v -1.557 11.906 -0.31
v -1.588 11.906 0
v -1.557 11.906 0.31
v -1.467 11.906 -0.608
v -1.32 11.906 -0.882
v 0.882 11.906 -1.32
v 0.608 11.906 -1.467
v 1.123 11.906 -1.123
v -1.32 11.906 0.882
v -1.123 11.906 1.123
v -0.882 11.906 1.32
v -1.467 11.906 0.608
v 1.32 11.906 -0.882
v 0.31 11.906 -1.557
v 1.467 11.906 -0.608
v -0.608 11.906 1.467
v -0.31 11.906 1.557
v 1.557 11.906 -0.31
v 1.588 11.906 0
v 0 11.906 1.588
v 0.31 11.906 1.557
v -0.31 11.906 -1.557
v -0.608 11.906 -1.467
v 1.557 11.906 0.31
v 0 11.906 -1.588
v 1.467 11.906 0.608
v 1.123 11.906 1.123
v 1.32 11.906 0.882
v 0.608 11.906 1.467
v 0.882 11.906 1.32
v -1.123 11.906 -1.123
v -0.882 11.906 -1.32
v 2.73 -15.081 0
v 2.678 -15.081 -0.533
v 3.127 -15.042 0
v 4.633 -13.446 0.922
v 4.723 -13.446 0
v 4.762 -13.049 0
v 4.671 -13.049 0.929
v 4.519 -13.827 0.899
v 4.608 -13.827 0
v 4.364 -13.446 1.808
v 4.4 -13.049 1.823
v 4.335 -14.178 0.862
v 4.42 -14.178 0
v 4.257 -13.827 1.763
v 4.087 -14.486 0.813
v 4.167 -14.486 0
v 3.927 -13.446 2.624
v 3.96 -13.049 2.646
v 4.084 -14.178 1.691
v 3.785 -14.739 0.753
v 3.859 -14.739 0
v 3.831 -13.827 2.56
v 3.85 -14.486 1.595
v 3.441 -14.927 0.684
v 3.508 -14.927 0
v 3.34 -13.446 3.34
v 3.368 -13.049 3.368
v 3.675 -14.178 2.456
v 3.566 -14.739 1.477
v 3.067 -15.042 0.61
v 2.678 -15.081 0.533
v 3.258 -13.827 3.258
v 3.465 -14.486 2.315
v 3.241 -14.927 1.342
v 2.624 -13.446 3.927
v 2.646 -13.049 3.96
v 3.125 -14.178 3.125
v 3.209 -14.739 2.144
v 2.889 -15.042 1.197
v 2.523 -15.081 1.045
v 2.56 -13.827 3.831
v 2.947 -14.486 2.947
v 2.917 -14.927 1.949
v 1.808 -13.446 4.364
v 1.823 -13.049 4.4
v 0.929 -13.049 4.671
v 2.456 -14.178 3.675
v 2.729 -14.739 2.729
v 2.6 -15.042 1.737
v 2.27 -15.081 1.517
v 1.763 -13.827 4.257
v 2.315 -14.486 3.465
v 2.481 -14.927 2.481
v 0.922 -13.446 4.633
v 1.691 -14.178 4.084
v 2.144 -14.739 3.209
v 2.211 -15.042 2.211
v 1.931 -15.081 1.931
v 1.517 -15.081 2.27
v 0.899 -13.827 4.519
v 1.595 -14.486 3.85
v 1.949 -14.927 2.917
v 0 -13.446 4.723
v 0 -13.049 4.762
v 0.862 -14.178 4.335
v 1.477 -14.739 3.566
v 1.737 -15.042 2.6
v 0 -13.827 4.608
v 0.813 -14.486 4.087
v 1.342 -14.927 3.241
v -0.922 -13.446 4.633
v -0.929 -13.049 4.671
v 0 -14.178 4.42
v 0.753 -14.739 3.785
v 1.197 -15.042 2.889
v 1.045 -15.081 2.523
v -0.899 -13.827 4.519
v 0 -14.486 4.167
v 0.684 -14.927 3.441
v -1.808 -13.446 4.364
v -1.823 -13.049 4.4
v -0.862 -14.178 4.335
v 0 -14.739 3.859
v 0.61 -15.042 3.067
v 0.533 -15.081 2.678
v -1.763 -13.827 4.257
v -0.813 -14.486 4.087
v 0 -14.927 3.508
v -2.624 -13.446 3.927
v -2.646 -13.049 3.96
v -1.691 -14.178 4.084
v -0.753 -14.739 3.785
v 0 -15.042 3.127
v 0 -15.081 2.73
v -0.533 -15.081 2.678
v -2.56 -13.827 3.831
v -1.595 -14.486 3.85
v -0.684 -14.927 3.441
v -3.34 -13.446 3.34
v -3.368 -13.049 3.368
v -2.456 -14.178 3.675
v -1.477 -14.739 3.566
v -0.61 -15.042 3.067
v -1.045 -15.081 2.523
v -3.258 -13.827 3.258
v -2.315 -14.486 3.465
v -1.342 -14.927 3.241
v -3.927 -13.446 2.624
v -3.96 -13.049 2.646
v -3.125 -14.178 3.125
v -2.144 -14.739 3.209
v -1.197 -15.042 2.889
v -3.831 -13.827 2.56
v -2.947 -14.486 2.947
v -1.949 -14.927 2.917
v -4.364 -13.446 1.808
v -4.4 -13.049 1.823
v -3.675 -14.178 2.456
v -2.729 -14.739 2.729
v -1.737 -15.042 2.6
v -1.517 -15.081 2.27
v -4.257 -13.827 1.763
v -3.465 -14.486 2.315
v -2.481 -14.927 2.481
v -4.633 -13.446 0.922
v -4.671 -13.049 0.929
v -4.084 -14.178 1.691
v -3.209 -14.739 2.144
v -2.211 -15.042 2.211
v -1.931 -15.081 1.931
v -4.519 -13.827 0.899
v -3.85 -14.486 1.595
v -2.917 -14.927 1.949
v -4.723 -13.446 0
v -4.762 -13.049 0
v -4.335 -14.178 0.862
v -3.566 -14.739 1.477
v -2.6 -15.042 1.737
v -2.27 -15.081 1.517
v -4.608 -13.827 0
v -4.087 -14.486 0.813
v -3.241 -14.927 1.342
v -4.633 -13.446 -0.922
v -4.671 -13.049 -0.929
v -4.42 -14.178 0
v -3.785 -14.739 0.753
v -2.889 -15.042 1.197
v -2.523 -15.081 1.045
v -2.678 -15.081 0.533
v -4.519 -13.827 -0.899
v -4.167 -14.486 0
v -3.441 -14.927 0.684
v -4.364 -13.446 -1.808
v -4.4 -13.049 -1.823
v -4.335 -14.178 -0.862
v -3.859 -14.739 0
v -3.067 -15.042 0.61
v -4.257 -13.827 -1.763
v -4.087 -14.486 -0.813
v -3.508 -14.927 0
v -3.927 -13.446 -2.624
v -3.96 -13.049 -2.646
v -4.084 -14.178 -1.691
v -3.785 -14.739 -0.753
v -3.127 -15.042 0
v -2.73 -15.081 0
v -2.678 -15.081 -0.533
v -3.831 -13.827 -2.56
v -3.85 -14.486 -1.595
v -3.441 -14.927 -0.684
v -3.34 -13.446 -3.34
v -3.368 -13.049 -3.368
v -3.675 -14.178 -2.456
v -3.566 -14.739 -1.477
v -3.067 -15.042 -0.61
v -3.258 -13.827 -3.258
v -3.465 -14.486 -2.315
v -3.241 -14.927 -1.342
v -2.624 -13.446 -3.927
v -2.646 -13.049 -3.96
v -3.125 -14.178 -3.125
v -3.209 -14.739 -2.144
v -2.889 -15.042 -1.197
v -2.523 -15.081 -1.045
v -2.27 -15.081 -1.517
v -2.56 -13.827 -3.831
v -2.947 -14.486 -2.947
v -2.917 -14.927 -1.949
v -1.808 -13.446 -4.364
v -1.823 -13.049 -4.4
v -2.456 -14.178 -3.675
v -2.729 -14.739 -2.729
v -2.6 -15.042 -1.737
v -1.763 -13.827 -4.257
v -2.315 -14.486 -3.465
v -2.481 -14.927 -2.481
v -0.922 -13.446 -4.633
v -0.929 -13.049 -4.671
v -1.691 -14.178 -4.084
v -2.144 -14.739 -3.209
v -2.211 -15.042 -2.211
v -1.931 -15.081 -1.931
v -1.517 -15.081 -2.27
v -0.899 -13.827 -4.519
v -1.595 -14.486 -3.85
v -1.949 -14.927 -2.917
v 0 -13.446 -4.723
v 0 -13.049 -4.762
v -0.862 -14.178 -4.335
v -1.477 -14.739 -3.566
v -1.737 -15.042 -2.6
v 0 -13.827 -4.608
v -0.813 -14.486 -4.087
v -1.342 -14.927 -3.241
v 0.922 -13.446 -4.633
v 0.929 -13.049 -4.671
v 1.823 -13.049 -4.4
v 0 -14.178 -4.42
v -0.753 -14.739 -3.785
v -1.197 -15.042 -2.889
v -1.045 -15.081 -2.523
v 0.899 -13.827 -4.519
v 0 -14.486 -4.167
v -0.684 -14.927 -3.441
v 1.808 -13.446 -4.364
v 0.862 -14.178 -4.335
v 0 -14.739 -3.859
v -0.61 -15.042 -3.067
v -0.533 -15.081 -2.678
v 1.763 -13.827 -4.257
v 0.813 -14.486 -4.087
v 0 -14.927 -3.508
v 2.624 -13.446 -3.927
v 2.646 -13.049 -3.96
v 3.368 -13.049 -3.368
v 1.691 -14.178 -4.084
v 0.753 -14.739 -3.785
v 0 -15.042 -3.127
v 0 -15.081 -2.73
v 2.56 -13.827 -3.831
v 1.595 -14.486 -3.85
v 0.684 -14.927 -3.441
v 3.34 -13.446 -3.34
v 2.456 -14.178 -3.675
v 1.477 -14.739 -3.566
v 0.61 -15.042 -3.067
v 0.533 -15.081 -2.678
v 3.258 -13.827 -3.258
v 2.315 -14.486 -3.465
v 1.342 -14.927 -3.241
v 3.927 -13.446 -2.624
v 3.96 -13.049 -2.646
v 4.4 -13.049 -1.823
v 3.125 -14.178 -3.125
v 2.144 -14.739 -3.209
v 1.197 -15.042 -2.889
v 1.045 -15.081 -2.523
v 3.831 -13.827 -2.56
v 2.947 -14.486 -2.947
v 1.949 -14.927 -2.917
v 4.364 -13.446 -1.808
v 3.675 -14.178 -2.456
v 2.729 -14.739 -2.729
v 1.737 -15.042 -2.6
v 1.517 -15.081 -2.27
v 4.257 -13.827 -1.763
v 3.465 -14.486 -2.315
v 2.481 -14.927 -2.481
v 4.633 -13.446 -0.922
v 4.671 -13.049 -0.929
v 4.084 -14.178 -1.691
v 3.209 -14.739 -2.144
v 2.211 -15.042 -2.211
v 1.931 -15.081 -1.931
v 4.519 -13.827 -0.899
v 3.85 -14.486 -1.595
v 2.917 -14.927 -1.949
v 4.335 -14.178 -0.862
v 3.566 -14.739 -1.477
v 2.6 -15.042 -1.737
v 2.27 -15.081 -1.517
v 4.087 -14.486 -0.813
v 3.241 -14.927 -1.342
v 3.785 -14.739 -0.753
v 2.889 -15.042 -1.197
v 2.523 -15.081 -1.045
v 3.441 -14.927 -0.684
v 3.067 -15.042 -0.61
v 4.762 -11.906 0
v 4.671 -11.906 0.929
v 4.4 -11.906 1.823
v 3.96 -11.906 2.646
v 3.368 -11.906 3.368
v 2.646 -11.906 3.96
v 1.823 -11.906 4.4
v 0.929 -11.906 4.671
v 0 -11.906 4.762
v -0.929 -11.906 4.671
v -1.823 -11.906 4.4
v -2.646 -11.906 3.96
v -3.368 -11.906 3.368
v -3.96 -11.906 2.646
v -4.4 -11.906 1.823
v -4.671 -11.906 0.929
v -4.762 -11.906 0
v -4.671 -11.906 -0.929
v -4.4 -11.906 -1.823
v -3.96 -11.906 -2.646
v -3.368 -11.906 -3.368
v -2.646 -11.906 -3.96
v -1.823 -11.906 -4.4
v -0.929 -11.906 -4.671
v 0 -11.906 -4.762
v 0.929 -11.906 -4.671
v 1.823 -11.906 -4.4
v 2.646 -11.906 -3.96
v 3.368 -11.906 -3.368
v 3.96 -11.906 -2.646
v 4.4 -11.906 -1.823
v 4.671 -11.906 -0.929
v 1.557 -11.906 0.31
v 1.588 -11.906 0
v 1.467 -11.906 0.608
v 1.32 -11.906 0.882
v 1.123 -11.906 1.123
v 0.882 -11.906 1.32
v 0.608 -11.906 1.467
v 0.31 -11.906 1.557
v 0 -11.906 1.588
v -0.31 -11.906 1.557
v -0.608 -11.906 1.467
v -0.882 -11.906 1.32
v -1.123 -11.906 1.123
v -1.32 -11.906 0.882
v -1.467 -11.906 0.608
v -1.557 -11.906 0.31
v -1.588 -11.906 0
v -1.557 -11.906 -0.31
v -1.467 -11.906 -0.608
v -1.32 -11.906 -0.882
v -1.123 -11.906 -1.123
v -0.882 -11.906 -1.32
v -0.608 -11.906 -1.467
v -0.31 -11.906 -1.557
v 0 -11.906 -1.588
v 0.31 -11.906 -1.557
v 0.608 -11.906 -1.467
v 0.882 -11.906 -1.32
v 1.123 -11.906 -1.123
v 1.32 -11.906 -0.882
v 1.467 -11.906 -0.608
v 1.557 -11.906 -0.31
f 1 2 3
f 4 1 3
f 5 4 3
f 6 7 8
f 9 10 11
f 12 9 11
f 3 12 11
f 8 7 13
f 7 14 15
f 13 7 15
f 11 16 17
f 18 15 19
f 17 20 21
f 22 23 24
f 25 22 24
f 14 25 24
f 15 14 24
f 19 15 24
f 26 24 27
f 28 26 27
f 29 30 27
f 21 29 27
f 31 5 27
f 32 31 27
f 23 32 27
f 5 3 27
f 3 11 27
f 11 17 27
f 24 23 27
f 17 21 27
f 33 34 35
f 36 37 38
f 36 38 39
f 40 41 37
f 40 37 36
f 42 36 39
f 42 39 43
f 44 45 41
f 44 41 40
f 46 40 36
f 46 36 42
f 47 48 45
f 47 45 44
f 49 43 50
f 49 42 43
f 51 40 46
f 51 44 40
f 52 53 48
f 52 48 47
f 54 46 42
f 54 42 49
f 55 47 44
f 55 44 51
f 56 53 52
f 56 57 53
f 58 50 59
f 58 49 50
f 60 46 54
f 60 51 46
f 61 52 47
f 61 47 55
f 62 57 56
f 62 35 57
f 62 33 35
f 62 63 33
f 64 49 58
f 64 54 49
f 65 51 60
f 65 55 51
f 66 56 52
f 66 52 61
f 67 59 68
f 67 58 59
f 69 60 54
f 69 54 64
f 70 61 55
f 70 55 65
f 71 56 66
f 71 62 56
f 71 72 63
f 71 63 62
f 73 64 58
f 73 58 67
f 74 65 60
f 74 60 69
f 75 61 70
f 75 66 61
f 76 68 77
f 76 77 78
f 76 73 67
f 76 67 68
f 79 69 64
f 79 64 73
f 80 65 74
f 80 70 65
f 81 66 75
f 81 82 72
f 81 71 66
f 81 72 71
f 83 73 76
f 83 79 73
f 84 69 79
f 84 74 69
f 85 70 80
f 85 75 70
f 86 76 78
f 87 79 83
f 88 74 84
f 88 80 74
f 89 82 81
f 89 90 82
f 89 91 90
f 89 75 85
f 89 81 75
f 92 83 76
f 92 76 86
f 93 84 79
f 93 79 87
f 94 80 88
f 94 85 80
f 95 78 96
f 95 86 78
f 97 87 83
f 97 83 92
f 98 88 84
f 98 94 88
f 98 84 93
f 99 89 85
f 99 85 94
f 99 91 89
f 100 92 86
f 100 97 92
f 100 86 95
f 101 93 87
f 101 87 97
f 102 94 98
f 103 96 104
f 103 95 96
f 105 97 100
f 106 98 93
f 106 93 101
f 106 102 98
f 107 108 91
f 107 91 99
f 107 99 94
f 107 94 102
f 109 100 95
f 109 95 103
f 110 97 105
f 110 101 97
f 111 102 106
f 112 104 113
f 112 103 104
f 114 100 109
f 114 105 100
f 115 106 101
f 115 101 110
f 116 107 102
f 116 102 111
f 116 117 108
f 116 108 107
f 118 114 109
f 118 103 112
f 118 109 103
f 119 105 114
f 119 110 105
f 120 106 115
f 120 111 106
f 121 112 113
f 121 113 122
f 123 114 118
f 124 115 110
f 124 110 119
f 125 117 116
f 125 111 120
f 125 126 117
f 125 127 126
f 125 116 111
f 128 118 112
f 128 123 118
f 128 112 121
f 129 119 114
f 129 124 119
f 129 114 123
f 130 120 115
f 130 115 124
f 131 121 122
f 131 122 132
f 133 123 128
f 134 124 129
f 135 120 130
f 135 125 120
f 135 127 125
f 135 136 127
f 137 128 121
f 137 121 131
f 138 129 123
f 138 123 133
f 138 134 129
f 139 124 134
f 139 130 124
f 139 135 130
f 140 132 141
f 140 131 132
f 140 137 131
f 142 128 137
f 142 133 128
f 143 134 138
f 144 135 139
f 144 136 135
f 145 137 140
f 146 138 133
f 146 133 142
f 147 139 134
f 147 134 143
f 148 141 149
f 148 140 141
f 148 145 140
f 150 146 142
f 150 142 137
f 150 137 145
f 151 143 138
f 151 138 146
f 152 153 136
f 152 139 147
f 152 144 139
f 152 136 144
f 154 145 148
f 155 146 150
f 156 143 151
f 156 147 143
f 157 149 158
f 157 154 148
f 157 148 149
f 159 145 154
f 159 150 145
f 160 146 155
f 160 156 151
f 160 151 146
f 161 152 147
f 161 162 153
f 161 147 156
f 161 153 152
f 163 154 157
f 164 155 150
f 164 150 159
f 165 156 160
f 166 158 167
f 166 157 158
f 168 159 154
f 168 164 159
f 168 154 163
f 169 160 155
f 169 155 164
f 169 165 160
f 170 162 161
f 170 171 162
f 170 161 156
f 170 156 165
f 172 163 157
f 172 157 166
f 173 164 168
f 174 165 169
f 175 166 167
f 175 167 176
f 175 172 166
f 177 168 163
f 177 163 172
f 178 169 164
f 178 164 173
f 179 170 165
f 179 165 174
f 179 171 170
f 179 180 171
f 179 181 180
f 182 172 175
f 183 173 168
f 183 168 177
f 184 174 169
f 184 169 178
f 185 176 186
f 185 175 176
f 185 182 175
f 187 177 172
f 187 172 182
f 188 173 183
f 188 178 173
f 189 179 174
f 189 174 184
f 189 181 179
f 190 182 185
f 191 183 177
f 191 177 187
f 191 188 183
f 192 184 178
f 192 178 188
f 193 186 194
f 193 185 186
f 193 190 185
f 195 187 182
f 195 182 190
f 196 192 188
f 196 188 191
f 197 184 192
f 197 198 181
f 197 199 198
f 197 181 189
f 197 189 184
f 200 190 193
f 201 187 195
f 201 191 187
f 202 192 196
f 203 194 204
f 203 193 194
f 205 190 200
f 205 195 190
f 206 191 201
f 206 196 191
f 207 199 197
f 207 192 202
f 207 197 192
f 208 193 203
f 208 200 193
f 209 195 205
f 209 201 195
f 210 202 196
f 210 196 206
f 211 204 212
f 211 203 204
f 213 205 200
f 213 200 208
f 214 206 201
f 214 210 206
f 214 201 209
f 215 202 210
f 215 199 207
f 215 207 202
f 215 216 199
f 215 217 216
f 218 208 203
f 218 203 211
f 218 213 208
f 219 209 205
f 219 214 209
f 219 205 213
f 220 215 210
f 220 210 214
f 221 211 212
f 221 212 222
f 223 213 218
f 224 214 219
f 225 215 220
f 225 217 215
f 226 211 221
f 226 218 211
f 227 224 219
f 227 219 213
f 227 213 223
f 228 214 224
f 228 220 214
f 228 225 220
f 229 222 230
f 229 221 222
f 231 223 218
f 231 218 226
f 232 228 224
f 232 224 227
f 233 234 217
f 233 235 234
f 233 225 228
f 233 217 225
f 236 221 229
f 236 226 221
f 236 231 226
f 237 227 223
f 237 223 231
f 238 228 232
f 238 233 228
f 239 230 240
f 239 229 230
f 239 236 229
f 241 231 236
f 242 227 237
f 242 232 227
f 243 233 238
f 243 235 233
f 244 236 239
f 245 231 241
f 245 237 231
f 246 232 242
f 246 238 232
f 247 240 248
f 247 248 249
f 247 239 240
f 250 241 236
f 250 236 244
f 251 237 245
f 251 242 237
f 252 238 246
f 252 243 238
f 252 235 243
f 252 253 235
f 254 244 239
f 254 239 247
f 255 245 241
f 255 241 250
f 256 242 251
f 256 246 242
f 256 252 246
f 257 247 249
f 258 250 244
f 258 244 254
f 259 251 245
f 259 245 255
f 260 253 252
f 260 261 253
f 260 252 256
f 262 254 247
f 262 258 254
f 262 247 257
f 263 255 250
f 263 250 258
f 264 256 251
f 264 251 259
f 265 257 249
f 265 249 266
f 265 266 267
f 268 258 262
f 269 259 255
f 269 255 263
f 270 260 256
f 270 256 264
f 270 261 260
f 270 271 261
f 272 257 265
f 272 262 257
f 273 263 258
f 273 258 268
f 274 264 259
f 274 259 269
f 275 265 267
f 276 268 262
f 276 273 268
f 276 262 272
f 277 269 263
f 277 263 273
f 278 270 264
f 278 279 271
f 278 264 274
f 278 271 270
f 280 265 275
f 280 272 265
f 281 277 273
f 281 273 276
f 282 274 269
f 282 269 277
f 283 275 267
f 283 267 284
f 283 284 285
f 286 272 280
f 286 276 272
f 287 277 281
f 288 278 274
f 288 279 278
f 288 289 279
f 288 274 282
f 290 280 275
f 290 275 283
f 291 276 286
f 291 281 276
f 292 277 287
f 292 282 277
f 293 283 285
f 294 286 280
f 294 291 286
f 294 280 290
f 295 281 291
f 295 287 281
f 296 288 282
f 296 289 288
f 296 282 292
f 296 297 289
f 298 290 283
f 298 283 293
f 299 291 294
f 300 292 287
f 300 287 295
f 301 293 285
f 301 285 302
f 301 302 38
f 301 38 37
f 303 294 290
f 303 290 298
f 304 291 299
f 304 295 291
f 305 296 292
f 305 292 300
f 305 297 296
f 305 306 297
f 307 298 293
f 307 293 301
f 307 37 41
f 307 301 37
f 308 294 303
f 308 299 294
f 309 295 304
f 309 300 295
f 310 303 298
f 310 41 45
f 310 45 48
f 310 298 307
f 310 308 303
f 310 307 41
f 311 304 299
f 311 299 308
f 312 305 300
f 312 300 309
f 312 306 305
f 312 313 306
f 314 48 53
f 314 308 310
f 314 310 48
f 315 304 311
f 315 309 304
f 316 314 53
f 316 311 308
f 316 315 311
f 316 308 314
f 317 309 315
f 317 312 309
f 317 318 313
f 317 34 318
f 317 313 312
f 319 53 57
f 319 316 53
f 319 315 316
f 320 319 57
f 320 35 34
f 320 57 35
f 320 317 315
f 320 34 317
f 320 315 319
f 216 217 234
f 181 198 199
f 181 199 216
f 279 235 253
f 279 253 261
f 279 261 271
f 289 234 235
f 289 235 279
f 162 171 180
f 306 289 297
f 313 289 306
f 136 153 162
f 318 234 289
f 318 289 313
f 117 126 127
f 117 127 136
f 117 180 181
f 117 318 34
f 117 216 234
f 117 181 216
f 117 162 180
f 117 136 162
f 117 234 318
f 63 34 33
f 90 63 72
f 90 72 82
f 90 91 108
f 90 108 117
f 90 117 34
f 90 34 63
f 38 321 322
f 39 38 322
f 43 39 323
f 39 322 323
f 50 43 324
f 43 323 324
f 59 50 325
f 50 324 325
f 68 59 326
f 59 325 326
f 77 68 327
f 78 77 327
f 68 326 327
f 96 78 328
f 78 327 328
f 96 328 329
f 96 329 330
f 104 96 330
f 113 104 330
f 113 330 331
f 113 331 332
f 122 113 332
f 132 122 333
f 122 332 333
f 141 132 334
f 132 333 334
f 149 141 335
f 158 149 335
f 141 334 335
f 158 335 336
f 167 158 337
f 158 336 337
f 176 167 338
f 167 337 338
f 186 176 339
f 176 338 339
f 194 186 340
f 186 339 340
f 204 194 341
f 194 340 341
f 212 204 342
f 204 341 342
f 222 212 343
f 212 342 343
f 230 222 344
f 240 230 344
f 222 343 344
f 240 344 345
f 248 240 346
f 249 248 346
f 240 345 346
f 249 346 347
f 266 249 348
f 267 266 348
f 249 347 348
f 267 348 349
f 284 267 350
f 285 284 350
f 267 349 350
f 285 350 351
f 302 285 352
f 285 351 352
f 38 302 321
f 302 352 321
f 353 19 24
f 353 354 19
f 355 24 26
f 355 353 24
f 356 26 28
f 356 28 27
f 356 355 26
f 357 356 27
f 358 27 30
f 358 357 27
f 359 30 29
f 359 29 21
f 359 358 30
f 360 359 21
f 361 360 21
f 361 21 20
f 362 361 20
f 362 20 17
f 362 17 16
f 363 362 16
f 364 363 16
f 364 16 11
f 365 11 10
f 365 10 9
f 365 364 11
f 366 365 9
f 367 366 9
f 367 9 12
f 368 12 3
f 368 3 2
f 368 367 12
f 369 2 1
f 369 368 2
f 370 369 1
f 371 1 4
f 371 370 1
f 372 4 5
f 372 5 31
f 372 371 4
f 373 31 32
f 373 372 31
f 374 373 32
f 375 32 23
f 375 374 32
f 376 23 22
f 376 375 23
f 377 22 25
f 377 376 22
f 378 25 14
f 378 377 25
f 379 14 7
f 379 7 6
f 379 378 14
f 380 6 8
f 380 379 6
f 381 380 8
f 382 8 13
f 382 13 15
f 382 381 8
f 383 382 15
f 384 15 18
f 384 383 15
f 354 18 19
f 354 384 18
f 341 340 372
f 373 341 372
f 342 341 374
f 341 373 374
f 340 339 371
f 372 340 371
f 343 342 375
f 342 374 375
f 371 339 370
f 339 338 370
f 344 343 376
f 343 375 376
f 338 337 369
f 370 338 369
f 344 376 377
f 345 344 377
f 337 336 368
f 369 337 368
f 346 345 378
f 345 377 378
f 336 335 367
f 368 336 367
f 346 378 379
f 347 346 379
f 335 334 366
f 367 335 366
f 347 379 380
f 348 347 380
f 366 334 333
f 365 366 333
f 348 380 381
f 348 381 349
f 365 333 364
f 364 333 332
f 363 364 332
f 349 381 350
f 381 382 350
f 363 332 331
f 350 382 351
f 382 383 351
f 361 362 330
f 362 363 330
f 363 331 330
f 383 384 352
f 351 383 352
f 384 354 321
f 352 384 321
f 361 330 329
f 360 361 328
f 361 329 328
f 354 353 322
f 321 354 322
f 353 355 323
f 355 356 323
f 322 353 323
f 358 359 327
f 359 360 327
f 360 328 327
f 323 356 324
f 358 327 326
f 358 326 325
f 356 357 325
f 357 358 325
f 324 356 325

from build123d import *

# Parameters (mm, degrees)
F0_R     = 1.5875
F1_DEPTH = 11.90625
F2_R     = 4.7625
F3_DEPTH = 3.175
F4_R     = 2.032


# Not quite as in the source:
# - a length typed as a fraction of an inch, garbled in the dataset ("3 / 203.2 mm" for 3/8 in), is restored


with BuildPart() as f1:
    # F0 (on Front) → F1 (new body, symmetric)
    with BuildSketch(Plane.XZ):
        Circle(F0_R)
    extrude(amount=F1_DEPTH, both=True)

    # F2 (on face) → F3 (join)
    with BuildSketch(Plane.XZ.offset(11.90625)):
        Circle(F2_R)
    extrude(amount=F3_DEPTH)

    # F4
    f4_edges = [f1.edges().sort_by_distance(p)[0] for p in [
        (-4.7625, -15.08125, 0),
    ]]
    fillet(f4_edges, radius=F4_R)


solid = f1.part
